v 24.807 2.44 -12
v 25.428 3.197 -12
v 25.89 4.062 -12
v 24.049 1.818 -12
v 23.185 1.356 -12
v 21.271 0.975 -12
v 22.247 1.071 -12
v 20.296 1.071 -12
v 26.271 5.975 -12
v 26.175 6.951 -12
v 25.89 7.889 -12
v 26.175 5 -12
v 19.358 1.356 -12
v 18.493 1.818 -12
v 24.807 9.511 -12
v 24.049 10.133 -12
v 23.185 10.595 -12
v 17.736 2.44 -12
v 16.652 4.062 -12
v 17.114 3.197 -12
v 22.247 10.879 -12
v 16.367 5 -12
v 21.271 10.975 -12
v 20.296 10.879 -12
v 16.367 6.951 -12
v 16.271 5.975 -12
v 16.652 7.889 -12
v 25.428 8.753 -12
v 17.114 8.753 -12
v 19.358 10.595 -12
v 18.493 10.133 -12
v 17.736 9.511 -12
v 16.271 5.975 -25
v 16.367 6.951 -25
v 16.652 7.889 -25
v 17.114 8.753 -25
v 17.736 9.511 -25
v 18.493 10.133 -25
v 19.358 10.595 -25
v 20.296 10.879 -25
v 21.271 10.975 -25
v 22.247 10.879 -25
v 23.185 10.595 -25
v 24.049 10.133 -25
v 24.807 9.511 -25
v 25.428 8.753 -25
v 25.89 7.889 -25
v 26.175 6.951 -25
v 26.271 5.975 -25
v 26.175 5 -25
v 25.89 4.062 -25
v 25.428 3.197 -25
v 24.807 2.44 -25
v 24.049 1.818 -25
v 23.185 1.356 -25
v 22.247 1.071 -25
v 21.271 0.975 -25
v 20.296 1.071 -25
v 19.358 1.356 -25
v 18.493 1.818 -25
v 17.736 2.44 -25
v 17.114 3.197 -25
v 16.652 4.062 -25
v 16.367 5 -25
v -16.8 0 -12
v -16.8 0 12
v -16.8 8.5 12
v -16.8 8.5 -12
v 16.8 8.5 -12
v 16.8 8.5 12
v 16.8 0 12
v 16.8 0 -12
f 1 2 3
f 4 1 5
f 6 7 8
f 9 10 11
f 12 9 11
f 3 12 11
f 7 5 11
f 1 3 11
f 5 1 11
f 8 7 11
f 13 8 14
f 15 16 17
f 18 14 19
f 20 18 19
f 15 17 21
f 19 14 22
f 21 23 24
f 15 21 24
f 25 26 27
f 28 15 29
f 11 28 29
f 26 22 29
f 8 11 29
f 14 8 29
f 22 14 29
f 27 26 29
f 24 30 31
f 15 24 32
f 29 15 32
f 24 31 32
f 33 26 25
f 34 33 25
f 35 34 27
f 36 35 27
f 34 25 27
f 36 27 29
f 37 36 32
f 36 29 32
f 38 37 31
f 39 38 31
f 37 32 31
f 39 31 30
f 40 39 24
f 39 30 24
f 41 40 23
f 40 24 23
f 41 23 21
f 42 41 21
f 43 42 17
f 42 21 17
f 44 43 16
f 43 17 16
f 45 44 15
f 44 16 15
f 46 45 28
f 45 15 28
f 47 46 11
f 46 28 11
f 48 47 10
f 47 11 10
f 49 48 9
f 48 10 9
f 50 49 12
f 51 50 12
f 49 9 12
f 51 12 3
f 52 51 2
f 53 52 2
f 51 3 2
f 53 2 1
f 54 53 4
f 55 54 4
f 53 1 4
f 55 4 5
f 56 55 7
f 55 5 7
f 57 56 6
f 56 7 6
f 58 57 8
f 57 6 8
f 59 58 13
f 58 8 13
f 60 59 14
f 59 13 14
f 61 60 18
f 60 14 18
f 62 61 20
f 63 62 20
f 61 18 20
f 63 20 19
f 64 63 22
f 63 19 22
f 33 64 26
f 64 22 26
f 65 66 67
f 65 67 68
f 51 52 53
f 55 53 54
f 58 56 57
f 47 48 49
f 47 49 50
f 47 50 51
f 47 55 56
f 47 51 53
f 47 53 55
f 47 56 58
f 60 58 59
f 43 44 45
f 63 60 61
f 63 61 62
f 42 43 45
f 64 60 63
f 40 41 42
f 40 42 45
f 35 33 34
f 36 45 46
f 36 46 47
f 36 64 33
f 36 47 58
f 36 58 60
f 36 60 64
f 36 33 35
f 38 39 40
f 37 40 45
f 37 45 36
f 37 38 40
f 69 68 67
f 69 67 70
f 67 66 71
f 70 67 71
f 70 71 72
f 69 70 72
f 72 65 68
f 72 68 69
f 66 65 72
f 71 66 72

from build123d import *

# Parameters (mm, degrees)
SKETCH1_W           = 33.6
SKETCH1_H           = 24
BOSS_EXTRUDE1_DEPTH = 8.5
SKETCH2_R           = 5
BOSS_EXTRUDE2_DEPTH = 13


with BuildPart() as part:
    # Sketch1 → Boss-Extrude1 (new body)
    with BuildSketch(Plane(origin=(0, 0, 0), x_dir=(1, 0, 0), z_dir=(0, 1, 0))):
        Rectangle(SKETCH1_W, SKETCH1_H)
    extrude(amount=BOSS_EXTRUDE1_DEPTH)


with BuildPart() as body_2:
    # Sketch2 → Boss-Extrude2 (new body)
    with BuildSketch(Plane(origin=(0, 0, -12), x_dir=(-1, 0, 0), z_dir=(0, 0, -1))):
        with Locations((-21.271091385, 5.975266173)):
            Circle(SKETCH2_R)
    extrude(amount=BOSS_EXTRUDE2_DEPTH)


solid = Compound([part.part, body_2.part])
